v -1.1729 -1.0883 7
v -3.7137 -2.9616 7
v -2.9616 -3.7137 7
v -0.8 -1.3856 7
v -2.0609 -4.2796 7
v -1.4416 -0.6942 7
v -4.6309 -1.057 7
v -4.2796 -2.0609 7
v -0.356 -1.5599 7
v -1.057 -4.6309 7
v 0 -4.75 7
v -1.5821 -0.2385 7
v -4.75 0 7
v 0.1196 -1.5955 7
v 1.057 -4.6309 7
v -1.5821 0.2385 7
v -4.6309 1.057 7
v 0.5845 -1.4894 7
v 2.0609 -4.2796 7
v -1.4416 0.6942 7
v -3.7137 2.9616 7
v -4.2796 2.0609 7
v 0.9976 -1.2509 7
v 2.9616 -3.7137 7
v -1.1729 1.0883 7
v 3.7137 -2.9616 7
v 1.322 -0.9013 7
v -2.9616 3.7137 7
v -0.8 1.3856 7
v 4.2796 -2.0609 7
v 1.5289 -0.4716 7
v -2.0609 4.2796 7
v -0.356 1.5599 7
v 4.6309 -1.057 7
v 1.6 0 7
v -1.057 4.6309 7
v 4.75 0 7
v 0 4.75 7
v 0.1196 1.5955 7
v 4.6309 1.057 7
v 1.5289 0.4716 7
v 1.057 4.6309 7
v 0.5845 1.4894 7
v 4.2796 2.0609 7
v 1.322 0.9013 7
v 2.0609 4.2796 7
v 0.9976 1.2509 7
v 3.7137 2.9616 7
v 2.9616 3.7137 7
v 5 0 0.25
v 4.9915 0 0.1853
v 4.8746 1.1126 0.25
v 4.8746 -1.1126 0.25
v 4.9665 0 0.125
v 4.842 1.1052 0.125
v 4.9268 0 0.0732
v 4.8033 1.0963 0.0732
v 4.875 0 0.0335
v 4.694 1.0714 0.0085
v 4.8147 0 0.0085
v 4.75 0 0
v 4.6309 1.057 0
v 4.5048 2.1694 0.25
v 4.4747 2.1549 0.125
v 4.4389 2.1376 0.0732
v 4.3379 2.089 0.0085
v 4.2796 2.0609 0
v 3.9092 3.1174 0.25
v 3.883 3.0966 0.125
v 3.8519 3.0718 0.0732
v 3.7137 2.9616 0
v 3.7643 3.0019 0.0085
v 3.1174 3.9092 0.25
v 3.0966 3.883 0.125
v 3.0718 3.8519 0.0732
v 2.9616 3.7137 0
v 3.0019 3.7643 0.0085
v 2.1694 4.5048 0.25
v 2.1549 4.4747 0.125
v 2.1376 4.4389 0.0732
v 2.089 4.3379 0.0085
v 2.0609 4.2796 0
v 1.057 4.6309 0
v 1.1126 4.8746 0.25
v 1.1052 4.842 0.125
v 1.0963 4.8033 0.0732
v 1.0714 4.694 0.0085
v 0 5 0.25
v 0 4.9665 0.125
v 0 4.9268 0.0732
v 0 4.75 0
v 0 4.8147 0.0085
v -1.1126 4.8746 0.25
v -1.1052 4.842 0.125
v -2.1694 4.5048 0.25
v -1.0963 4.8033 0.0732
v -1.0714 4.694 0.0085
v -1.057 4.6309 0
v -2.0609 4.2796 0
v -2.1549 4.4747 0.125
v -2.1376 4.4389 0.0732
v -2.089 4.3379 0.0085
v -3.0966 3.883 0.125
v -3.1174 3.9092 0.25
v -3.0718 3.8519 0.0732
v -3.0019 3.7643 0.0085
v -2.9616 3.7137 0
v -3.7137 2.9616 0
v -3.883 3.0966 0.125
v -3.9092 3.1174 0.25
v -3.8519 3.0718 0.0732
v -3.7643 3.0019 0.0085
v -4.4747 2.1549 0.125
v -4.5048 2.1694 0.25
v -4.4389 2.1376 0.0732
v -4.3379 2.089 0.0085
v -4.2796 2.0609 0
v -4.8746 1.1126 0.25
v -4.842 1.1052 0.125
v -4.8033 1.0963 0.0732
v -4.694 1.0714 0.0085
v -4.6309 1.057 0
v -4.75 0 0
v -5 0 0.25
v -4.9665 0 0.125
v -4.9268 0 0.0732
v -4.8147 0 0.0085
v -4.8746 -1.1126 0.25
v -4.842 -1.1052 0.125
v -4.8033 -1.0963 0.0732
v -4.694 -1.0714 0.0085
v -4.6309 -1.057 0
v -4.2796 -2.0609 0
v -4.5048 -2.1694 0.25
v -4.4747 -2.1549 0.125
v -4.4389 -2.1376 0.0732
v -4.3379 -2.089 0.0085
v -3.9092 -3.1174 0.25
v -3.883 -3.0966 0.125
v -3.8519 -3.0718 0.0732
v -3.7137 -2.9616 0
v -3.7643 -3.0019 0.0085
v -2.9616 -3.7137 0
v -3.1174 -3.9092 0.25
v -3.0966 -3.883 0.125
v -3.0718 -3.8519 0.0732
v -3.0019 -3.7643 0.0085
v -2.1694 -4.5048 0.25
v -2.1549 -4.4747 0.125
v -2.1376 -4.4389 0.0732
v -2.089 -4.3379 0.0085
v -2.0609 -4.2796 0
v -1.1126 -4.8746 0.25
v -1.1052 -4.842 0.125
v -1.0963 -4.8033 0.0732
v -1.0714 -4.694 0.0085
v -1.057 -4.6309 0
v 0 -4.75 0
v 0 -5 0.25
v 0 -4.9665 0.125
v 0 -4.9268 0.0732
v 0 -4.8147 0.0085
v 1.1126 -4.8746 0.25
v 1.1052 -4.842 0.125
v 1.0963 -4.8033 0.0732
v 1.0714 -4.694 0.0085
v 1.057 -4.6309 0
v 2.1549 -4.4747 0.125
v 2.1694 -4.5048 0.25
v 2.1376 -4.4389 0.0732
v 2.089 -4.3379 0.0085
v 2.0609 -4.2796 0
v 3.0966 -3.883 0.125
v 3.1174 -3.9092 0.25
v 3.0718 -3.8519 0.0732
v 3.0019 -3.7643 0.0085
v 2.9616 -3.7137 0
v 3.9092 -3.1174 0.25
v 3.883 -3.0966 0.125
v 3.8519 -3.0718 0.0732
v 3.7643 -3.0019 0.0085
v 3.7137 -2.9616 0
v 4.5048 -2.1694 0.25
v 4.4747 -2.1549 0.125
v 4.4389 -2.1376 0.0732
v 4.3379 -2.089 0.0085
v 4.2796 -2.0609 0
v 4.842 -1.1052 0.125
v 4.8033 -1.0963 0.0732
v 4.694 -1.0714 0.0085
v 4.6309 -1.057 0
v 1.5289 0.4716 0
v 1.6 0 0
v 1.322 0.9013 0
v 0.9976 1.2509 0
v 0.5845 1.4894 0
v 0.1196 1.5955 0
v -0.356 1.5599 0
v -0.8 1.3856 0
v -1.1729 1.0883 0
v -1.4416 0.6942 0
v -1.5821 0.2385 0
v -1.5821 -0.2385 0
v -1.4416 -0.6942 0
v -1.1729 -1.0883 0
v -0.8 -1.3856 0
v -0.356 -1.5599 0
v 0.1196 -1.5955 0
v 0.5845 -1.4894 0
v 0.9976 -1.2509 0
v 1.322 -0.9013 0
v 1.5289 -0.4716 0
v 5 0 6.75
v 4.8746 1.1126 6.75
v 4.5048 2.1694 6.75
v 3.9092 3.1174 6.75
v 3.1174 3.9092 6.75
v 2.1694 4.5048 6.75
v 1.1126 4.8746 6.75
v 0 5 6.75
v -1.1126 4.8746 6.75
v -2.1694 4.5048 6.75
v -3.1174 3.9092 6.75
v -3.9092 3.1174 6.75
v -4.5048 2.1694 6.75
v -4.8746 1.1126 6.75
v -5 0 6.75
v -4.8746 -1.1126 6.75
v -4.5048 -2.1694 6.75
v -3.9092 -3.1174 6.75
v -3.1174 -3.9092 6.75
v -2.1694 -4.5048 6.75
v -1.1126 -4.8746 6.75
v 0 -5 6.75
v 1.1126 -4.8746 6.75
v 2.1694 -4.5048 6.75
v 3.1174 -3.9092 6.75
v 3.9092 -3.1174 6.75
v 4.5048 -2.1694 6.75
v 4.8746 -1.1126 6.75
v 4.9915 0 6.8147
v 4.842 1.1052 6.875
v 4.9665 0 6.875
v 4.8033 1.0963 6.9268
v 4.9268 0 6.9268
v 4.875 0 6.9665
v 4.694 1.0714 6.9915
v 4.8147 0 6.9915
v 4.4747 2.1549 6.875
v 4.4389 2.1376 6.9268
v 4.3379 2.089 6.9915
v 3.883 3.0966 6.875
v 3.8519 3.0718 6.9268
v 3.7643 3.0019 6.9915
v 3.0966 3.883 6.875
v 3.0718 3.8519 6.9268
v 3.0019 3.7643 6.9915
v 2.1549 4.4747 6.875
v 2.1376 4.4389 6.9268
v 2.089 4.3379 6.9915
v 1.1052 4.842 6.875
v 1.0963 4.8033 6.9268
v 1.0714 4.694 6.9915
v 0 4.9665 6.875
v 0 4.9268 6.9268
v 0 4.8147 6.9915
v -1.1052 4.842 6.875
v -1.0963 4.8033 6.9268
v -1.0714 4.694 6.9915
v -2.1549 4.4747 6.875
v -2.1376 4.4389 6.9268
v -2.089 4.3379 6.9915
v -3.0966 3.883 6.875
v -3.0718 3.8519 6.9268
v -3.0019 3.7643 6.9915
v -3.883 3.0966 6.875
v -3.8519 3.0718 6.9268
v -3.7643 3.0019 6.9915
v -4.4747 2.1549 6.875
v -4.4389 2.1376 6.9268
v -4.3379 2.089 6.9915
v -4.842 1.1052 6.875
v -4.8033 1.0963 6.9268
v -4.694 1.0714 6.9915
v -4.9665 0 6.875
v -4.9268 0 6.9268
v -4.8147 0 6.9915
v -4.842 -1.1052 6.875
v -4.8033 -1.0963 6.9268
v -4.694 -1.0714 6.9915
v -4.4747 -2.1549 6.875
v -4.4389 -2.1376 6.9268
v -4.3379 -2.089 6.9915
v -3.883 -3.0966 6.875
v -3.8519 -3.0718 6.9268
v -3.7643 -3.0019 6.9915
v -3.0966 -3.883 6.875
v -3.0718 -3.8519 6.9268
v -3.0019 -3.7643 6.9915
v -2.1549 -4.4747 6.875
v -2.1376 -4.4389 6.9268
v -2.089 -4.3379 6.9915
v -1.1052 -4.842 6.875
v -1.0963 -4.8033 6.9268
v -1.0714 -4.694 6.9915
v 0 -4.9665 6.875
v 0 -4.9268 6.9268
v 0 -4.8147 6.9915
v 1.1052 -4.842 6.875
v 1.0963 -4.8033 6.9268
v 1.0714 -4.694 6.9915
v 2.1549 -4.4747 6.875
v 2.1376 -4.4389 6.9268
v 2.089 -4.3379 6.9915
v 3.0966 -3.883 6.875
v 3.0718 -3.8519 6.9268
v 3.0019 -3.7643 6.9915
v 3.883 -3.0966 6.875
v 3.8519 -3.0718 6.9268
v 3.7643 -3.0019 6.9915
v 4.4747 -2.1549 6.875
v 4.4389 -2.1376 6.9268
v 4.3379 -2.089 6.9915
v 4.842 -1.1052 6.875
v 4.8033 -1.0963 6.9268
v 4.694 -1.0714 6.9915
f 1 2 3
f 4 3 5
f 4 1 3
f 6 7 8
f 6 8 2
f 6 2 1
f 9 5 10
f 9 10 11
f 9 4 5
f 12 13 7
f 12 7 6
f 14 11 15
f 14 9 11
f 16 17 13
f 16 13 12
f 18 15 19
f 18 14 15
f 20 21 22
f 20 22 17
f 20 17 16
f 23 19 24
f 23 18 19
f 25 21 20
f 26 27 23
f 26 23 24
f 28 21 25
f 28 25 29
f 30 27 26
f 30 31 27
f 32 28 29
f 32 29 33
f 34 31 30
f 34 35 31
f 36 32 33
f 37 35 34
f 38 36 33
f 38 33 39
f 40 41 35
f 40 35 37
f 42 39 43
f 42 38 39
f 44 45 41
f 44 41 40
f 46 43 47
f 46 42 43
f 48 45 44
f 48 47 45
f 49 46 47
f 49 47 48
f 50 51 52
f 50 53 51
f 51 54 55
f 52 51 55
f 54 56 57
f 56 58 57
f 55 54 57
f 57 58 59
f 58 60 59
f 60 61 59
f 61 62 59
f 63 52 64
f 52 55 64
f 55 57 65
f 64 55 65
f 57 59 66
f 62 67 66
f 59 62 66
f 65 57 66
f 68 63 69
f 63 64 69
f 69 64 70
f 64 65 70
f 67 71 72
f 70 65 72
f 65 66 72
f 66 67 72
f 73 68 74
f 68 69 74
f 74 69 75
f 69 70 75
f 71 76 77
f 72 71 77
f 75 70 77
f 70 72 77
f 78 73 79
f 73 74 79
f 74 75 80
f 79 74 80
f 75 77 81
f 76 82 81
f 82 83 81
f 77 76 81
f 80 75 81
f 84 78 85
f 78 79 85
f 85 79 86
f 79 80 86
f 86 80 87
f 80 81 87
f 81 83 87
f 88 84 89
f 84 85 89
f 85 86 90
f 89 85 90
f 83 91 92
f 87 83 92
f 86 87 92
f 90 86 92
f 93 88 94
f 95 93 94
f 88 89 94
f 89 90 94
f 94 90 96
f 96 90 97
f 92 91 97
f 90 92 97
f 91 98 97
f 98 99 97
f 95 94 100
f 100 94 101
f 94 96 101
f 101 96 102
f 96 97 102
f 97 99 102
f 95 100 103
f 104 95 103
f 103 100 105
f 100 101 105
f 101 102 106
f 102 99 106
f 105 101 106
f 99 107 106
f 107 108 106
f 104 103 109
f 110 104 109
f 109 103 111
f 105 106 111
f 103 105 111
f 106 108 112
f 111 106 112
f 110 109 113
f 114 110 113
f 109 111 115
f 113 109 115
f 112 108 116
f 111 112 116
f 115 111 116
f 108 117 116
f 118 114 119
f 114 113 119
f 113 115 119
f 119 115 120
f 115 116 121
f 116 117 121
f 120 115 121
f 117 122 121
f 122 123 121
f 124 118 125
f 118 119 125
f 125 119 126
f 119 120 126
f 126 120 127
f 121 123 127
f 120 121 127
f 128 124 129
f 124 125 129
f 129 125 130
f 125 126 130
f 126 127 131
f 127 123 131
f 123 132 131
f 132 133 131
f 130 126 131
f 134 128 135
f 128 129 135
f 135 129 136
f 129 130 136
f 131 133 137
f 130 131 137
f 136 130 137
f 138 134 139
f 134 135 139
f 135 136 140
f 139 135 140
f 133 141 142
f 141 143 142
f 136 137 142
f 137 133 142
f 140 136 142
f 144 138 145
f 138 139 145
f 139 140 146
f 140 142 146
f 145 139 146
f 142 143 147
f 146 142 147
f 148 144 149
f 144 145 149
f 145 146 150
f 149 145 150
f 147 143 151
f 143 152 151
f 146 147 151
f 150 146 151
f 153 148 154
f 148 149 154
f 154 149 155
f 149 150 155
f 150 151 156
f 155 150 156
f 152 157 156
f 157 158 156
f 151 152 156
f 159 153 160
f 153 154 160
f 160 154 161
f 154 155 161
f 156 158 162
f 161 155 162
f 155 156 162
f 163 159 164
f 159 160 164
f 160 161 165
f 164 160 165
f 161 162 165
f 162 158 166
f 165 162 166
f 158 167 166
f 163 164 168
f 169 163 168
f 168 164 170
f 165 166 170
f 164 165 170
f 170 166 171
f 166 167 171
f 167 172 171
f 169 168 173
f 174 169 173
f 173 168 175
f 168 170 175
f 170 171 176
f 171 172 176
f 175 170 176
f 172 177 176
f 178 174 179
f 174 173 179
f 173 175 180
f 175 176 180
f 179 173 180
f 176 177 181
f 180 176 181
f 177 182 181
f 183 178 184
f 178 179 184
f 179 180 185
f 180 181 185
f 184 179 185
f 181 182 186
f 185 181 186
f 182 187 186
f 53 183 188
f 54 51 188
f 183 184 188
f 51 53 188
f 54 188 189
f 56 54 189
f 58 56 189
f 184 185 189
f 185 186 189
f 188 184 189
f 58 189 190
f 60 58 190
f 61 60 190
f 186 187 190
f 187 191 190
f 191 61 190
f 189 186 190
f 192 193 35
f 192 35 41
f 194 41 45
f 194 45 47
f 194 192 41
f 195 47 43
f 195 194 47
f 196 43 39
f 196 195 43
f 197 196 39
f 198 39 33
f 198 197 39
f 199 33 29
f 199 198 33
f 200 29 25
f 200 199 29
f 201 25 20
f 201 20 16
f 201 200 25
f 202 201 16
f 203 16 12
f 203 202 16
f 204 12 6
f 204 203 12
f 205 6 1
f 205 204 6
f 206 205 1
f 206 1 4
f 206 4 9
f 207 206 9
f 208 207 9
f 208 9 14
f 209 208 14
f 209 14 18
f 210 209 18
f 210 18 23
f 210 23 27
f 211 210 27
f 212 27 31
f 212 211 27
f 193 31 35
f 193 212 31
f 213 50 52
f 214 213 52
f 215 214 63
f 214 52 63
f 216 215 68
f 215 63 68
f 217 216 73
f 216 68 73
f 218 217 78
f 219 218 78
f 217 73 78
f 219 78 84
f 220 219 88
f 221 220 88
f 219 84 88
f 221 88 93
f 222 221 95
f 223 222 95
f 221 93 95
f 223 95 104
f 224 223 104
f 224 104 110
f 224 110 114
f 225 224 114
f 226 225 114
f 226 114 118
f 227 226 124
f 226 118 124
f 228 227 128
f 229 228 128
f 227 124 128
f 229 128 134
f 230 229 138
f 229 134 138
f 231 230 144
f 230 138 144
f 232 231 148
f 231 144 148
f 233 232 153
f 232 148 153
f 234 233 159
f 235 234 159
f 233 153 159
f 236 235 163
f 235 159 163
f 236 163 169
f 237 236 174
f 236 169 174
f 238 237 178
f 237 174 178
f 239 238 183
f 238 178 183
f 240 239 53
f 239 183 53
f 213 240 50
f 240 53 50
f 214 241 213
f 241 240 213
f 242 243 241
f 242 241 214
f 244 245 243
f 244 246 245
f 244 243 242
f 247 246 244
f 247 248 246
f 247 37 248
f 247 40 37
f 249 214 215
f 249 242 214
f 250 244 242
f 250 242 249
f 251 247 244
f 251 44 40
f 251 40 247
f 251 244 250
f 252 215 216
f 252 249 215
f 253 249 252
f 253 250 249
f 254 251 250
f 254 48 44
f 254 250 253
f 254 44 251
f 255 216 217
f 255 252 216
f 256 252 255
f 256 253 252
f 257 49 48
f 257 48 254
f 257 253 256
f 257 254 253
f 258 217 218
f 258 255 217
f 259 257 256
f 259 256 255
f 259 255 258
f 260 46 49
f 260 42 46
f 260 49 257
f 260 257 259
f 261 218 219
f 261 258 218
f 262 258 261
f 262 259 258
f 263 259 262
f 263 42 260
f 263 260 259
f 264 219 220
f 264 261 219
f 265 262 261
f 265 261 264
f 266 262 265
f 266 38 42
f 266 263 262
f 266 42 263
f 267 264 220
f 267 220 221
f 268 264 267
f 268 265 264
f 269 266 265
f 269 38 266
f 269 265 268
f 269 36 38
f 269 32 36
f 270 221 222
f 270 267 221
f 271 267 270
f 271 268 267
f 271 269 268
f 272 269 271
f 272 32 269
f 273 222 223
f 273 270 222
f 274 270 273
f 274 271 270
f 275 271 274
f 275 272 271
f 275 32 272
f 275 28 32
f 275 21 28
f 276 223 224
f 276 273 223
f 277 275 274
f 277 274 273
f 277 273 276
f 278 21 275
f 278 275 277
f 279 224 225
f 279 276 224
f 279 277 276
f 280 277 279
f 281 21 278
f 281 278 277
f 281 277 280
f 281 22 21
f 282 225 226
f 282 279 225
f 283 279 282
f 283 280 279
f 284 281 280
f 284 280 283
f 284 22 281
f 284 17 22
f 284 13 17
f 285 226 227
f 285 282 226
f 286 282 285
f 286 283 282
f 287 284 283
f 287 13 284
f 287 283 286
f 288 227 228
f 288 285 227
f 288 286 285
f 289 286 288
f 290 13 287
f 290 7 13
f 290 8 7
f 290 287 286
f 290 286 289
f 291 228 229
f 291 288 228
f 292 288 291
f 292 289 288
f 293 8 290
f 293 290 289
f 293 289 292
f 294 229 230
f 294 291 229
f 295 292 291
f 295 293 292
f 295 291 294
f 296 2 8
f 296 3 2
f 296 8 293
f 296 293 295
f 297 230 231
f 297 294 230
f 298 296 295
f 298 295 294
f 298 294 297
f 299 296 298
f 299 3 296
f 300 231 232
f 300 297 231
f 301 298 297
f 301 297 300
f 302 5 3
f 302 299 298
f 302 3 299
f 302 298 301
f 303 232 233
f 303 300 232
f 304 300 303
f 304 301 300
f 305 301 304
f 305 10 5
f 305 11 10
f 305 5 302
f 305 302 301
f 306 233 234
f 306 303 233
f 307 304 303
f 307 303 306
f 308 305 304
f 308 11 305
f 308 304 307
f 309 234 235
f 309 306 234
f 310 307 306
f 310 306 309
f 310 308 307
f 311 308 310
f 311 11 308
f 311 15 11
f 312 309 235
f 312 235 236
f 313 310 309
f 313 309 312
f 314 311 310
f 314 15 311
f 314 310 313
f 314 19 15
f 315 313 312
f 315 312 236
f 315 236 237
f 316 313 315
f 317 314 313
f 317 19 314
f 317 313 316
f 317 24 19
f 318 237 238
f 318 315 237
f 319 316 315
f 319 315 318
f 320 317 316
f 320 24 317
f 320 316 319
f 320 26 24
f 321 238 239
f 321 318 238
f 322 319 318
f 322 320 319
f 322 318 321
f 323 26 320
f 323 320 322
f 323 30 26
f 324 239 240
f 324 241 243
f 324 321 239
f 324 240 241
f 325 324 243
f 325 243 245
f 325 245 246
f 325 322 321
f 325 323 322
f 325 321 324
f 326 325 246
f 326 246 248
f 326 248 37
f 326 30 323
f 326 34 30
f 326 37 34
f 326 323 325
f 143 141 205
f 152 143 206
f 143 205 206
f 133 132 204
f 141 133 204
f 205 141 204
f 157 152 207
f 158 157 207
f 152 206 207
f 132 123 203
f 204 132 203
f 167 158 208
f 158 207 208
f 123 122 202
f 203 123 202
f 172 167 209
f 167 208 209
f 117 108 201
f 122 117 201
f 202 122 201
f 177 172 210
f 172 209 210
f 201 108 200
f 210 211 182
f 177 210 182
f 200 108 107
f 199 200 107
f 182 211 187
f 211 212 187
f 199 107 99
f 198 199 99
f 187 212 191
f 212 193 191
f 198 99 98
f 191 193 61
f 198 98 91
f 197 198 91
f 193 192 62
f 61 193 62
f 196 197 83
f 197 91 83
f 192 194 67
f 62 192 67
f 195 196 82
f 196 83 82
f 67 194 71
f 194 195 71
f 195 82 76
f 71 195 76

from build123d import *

# Parameters (mm, degrees)
ESQUISSE1_R        = 5
ESQUISSE1_R_2      = 1.6
BOSS_EXTRU_1_DEPTH = 7
CONG_1_R           = 0.25
CONG_2_R           = 0.25


with BuildPart() as part:
    # Esquisse1 → Boss.-Extru.1 (new body)
    with BuildSketch(Plane.XY):
        Circle(ESQUISSE1_R)
        Circle(ESQUISSE1_R_2, mode=Mode.SUBTRACT)
    extrude(amount=BOSS_EXTRU_1_DEPTH)

    # Congé1
    cong_1_edges = [part.edges().sort_by_distance(p)[0] for p in [
        (-5, 0, 7),
    ]]
    fillet(cong_1_edges, radius=CONG_1_R)

    # Congé2
    cong_2_edges = [part.edges().sort_by_distance(p)[0] for p in [
        (-5, 0, 0),
    ]]
    fillet(cong_2_edges, radius=CONG_2_R)


solid = part.part
